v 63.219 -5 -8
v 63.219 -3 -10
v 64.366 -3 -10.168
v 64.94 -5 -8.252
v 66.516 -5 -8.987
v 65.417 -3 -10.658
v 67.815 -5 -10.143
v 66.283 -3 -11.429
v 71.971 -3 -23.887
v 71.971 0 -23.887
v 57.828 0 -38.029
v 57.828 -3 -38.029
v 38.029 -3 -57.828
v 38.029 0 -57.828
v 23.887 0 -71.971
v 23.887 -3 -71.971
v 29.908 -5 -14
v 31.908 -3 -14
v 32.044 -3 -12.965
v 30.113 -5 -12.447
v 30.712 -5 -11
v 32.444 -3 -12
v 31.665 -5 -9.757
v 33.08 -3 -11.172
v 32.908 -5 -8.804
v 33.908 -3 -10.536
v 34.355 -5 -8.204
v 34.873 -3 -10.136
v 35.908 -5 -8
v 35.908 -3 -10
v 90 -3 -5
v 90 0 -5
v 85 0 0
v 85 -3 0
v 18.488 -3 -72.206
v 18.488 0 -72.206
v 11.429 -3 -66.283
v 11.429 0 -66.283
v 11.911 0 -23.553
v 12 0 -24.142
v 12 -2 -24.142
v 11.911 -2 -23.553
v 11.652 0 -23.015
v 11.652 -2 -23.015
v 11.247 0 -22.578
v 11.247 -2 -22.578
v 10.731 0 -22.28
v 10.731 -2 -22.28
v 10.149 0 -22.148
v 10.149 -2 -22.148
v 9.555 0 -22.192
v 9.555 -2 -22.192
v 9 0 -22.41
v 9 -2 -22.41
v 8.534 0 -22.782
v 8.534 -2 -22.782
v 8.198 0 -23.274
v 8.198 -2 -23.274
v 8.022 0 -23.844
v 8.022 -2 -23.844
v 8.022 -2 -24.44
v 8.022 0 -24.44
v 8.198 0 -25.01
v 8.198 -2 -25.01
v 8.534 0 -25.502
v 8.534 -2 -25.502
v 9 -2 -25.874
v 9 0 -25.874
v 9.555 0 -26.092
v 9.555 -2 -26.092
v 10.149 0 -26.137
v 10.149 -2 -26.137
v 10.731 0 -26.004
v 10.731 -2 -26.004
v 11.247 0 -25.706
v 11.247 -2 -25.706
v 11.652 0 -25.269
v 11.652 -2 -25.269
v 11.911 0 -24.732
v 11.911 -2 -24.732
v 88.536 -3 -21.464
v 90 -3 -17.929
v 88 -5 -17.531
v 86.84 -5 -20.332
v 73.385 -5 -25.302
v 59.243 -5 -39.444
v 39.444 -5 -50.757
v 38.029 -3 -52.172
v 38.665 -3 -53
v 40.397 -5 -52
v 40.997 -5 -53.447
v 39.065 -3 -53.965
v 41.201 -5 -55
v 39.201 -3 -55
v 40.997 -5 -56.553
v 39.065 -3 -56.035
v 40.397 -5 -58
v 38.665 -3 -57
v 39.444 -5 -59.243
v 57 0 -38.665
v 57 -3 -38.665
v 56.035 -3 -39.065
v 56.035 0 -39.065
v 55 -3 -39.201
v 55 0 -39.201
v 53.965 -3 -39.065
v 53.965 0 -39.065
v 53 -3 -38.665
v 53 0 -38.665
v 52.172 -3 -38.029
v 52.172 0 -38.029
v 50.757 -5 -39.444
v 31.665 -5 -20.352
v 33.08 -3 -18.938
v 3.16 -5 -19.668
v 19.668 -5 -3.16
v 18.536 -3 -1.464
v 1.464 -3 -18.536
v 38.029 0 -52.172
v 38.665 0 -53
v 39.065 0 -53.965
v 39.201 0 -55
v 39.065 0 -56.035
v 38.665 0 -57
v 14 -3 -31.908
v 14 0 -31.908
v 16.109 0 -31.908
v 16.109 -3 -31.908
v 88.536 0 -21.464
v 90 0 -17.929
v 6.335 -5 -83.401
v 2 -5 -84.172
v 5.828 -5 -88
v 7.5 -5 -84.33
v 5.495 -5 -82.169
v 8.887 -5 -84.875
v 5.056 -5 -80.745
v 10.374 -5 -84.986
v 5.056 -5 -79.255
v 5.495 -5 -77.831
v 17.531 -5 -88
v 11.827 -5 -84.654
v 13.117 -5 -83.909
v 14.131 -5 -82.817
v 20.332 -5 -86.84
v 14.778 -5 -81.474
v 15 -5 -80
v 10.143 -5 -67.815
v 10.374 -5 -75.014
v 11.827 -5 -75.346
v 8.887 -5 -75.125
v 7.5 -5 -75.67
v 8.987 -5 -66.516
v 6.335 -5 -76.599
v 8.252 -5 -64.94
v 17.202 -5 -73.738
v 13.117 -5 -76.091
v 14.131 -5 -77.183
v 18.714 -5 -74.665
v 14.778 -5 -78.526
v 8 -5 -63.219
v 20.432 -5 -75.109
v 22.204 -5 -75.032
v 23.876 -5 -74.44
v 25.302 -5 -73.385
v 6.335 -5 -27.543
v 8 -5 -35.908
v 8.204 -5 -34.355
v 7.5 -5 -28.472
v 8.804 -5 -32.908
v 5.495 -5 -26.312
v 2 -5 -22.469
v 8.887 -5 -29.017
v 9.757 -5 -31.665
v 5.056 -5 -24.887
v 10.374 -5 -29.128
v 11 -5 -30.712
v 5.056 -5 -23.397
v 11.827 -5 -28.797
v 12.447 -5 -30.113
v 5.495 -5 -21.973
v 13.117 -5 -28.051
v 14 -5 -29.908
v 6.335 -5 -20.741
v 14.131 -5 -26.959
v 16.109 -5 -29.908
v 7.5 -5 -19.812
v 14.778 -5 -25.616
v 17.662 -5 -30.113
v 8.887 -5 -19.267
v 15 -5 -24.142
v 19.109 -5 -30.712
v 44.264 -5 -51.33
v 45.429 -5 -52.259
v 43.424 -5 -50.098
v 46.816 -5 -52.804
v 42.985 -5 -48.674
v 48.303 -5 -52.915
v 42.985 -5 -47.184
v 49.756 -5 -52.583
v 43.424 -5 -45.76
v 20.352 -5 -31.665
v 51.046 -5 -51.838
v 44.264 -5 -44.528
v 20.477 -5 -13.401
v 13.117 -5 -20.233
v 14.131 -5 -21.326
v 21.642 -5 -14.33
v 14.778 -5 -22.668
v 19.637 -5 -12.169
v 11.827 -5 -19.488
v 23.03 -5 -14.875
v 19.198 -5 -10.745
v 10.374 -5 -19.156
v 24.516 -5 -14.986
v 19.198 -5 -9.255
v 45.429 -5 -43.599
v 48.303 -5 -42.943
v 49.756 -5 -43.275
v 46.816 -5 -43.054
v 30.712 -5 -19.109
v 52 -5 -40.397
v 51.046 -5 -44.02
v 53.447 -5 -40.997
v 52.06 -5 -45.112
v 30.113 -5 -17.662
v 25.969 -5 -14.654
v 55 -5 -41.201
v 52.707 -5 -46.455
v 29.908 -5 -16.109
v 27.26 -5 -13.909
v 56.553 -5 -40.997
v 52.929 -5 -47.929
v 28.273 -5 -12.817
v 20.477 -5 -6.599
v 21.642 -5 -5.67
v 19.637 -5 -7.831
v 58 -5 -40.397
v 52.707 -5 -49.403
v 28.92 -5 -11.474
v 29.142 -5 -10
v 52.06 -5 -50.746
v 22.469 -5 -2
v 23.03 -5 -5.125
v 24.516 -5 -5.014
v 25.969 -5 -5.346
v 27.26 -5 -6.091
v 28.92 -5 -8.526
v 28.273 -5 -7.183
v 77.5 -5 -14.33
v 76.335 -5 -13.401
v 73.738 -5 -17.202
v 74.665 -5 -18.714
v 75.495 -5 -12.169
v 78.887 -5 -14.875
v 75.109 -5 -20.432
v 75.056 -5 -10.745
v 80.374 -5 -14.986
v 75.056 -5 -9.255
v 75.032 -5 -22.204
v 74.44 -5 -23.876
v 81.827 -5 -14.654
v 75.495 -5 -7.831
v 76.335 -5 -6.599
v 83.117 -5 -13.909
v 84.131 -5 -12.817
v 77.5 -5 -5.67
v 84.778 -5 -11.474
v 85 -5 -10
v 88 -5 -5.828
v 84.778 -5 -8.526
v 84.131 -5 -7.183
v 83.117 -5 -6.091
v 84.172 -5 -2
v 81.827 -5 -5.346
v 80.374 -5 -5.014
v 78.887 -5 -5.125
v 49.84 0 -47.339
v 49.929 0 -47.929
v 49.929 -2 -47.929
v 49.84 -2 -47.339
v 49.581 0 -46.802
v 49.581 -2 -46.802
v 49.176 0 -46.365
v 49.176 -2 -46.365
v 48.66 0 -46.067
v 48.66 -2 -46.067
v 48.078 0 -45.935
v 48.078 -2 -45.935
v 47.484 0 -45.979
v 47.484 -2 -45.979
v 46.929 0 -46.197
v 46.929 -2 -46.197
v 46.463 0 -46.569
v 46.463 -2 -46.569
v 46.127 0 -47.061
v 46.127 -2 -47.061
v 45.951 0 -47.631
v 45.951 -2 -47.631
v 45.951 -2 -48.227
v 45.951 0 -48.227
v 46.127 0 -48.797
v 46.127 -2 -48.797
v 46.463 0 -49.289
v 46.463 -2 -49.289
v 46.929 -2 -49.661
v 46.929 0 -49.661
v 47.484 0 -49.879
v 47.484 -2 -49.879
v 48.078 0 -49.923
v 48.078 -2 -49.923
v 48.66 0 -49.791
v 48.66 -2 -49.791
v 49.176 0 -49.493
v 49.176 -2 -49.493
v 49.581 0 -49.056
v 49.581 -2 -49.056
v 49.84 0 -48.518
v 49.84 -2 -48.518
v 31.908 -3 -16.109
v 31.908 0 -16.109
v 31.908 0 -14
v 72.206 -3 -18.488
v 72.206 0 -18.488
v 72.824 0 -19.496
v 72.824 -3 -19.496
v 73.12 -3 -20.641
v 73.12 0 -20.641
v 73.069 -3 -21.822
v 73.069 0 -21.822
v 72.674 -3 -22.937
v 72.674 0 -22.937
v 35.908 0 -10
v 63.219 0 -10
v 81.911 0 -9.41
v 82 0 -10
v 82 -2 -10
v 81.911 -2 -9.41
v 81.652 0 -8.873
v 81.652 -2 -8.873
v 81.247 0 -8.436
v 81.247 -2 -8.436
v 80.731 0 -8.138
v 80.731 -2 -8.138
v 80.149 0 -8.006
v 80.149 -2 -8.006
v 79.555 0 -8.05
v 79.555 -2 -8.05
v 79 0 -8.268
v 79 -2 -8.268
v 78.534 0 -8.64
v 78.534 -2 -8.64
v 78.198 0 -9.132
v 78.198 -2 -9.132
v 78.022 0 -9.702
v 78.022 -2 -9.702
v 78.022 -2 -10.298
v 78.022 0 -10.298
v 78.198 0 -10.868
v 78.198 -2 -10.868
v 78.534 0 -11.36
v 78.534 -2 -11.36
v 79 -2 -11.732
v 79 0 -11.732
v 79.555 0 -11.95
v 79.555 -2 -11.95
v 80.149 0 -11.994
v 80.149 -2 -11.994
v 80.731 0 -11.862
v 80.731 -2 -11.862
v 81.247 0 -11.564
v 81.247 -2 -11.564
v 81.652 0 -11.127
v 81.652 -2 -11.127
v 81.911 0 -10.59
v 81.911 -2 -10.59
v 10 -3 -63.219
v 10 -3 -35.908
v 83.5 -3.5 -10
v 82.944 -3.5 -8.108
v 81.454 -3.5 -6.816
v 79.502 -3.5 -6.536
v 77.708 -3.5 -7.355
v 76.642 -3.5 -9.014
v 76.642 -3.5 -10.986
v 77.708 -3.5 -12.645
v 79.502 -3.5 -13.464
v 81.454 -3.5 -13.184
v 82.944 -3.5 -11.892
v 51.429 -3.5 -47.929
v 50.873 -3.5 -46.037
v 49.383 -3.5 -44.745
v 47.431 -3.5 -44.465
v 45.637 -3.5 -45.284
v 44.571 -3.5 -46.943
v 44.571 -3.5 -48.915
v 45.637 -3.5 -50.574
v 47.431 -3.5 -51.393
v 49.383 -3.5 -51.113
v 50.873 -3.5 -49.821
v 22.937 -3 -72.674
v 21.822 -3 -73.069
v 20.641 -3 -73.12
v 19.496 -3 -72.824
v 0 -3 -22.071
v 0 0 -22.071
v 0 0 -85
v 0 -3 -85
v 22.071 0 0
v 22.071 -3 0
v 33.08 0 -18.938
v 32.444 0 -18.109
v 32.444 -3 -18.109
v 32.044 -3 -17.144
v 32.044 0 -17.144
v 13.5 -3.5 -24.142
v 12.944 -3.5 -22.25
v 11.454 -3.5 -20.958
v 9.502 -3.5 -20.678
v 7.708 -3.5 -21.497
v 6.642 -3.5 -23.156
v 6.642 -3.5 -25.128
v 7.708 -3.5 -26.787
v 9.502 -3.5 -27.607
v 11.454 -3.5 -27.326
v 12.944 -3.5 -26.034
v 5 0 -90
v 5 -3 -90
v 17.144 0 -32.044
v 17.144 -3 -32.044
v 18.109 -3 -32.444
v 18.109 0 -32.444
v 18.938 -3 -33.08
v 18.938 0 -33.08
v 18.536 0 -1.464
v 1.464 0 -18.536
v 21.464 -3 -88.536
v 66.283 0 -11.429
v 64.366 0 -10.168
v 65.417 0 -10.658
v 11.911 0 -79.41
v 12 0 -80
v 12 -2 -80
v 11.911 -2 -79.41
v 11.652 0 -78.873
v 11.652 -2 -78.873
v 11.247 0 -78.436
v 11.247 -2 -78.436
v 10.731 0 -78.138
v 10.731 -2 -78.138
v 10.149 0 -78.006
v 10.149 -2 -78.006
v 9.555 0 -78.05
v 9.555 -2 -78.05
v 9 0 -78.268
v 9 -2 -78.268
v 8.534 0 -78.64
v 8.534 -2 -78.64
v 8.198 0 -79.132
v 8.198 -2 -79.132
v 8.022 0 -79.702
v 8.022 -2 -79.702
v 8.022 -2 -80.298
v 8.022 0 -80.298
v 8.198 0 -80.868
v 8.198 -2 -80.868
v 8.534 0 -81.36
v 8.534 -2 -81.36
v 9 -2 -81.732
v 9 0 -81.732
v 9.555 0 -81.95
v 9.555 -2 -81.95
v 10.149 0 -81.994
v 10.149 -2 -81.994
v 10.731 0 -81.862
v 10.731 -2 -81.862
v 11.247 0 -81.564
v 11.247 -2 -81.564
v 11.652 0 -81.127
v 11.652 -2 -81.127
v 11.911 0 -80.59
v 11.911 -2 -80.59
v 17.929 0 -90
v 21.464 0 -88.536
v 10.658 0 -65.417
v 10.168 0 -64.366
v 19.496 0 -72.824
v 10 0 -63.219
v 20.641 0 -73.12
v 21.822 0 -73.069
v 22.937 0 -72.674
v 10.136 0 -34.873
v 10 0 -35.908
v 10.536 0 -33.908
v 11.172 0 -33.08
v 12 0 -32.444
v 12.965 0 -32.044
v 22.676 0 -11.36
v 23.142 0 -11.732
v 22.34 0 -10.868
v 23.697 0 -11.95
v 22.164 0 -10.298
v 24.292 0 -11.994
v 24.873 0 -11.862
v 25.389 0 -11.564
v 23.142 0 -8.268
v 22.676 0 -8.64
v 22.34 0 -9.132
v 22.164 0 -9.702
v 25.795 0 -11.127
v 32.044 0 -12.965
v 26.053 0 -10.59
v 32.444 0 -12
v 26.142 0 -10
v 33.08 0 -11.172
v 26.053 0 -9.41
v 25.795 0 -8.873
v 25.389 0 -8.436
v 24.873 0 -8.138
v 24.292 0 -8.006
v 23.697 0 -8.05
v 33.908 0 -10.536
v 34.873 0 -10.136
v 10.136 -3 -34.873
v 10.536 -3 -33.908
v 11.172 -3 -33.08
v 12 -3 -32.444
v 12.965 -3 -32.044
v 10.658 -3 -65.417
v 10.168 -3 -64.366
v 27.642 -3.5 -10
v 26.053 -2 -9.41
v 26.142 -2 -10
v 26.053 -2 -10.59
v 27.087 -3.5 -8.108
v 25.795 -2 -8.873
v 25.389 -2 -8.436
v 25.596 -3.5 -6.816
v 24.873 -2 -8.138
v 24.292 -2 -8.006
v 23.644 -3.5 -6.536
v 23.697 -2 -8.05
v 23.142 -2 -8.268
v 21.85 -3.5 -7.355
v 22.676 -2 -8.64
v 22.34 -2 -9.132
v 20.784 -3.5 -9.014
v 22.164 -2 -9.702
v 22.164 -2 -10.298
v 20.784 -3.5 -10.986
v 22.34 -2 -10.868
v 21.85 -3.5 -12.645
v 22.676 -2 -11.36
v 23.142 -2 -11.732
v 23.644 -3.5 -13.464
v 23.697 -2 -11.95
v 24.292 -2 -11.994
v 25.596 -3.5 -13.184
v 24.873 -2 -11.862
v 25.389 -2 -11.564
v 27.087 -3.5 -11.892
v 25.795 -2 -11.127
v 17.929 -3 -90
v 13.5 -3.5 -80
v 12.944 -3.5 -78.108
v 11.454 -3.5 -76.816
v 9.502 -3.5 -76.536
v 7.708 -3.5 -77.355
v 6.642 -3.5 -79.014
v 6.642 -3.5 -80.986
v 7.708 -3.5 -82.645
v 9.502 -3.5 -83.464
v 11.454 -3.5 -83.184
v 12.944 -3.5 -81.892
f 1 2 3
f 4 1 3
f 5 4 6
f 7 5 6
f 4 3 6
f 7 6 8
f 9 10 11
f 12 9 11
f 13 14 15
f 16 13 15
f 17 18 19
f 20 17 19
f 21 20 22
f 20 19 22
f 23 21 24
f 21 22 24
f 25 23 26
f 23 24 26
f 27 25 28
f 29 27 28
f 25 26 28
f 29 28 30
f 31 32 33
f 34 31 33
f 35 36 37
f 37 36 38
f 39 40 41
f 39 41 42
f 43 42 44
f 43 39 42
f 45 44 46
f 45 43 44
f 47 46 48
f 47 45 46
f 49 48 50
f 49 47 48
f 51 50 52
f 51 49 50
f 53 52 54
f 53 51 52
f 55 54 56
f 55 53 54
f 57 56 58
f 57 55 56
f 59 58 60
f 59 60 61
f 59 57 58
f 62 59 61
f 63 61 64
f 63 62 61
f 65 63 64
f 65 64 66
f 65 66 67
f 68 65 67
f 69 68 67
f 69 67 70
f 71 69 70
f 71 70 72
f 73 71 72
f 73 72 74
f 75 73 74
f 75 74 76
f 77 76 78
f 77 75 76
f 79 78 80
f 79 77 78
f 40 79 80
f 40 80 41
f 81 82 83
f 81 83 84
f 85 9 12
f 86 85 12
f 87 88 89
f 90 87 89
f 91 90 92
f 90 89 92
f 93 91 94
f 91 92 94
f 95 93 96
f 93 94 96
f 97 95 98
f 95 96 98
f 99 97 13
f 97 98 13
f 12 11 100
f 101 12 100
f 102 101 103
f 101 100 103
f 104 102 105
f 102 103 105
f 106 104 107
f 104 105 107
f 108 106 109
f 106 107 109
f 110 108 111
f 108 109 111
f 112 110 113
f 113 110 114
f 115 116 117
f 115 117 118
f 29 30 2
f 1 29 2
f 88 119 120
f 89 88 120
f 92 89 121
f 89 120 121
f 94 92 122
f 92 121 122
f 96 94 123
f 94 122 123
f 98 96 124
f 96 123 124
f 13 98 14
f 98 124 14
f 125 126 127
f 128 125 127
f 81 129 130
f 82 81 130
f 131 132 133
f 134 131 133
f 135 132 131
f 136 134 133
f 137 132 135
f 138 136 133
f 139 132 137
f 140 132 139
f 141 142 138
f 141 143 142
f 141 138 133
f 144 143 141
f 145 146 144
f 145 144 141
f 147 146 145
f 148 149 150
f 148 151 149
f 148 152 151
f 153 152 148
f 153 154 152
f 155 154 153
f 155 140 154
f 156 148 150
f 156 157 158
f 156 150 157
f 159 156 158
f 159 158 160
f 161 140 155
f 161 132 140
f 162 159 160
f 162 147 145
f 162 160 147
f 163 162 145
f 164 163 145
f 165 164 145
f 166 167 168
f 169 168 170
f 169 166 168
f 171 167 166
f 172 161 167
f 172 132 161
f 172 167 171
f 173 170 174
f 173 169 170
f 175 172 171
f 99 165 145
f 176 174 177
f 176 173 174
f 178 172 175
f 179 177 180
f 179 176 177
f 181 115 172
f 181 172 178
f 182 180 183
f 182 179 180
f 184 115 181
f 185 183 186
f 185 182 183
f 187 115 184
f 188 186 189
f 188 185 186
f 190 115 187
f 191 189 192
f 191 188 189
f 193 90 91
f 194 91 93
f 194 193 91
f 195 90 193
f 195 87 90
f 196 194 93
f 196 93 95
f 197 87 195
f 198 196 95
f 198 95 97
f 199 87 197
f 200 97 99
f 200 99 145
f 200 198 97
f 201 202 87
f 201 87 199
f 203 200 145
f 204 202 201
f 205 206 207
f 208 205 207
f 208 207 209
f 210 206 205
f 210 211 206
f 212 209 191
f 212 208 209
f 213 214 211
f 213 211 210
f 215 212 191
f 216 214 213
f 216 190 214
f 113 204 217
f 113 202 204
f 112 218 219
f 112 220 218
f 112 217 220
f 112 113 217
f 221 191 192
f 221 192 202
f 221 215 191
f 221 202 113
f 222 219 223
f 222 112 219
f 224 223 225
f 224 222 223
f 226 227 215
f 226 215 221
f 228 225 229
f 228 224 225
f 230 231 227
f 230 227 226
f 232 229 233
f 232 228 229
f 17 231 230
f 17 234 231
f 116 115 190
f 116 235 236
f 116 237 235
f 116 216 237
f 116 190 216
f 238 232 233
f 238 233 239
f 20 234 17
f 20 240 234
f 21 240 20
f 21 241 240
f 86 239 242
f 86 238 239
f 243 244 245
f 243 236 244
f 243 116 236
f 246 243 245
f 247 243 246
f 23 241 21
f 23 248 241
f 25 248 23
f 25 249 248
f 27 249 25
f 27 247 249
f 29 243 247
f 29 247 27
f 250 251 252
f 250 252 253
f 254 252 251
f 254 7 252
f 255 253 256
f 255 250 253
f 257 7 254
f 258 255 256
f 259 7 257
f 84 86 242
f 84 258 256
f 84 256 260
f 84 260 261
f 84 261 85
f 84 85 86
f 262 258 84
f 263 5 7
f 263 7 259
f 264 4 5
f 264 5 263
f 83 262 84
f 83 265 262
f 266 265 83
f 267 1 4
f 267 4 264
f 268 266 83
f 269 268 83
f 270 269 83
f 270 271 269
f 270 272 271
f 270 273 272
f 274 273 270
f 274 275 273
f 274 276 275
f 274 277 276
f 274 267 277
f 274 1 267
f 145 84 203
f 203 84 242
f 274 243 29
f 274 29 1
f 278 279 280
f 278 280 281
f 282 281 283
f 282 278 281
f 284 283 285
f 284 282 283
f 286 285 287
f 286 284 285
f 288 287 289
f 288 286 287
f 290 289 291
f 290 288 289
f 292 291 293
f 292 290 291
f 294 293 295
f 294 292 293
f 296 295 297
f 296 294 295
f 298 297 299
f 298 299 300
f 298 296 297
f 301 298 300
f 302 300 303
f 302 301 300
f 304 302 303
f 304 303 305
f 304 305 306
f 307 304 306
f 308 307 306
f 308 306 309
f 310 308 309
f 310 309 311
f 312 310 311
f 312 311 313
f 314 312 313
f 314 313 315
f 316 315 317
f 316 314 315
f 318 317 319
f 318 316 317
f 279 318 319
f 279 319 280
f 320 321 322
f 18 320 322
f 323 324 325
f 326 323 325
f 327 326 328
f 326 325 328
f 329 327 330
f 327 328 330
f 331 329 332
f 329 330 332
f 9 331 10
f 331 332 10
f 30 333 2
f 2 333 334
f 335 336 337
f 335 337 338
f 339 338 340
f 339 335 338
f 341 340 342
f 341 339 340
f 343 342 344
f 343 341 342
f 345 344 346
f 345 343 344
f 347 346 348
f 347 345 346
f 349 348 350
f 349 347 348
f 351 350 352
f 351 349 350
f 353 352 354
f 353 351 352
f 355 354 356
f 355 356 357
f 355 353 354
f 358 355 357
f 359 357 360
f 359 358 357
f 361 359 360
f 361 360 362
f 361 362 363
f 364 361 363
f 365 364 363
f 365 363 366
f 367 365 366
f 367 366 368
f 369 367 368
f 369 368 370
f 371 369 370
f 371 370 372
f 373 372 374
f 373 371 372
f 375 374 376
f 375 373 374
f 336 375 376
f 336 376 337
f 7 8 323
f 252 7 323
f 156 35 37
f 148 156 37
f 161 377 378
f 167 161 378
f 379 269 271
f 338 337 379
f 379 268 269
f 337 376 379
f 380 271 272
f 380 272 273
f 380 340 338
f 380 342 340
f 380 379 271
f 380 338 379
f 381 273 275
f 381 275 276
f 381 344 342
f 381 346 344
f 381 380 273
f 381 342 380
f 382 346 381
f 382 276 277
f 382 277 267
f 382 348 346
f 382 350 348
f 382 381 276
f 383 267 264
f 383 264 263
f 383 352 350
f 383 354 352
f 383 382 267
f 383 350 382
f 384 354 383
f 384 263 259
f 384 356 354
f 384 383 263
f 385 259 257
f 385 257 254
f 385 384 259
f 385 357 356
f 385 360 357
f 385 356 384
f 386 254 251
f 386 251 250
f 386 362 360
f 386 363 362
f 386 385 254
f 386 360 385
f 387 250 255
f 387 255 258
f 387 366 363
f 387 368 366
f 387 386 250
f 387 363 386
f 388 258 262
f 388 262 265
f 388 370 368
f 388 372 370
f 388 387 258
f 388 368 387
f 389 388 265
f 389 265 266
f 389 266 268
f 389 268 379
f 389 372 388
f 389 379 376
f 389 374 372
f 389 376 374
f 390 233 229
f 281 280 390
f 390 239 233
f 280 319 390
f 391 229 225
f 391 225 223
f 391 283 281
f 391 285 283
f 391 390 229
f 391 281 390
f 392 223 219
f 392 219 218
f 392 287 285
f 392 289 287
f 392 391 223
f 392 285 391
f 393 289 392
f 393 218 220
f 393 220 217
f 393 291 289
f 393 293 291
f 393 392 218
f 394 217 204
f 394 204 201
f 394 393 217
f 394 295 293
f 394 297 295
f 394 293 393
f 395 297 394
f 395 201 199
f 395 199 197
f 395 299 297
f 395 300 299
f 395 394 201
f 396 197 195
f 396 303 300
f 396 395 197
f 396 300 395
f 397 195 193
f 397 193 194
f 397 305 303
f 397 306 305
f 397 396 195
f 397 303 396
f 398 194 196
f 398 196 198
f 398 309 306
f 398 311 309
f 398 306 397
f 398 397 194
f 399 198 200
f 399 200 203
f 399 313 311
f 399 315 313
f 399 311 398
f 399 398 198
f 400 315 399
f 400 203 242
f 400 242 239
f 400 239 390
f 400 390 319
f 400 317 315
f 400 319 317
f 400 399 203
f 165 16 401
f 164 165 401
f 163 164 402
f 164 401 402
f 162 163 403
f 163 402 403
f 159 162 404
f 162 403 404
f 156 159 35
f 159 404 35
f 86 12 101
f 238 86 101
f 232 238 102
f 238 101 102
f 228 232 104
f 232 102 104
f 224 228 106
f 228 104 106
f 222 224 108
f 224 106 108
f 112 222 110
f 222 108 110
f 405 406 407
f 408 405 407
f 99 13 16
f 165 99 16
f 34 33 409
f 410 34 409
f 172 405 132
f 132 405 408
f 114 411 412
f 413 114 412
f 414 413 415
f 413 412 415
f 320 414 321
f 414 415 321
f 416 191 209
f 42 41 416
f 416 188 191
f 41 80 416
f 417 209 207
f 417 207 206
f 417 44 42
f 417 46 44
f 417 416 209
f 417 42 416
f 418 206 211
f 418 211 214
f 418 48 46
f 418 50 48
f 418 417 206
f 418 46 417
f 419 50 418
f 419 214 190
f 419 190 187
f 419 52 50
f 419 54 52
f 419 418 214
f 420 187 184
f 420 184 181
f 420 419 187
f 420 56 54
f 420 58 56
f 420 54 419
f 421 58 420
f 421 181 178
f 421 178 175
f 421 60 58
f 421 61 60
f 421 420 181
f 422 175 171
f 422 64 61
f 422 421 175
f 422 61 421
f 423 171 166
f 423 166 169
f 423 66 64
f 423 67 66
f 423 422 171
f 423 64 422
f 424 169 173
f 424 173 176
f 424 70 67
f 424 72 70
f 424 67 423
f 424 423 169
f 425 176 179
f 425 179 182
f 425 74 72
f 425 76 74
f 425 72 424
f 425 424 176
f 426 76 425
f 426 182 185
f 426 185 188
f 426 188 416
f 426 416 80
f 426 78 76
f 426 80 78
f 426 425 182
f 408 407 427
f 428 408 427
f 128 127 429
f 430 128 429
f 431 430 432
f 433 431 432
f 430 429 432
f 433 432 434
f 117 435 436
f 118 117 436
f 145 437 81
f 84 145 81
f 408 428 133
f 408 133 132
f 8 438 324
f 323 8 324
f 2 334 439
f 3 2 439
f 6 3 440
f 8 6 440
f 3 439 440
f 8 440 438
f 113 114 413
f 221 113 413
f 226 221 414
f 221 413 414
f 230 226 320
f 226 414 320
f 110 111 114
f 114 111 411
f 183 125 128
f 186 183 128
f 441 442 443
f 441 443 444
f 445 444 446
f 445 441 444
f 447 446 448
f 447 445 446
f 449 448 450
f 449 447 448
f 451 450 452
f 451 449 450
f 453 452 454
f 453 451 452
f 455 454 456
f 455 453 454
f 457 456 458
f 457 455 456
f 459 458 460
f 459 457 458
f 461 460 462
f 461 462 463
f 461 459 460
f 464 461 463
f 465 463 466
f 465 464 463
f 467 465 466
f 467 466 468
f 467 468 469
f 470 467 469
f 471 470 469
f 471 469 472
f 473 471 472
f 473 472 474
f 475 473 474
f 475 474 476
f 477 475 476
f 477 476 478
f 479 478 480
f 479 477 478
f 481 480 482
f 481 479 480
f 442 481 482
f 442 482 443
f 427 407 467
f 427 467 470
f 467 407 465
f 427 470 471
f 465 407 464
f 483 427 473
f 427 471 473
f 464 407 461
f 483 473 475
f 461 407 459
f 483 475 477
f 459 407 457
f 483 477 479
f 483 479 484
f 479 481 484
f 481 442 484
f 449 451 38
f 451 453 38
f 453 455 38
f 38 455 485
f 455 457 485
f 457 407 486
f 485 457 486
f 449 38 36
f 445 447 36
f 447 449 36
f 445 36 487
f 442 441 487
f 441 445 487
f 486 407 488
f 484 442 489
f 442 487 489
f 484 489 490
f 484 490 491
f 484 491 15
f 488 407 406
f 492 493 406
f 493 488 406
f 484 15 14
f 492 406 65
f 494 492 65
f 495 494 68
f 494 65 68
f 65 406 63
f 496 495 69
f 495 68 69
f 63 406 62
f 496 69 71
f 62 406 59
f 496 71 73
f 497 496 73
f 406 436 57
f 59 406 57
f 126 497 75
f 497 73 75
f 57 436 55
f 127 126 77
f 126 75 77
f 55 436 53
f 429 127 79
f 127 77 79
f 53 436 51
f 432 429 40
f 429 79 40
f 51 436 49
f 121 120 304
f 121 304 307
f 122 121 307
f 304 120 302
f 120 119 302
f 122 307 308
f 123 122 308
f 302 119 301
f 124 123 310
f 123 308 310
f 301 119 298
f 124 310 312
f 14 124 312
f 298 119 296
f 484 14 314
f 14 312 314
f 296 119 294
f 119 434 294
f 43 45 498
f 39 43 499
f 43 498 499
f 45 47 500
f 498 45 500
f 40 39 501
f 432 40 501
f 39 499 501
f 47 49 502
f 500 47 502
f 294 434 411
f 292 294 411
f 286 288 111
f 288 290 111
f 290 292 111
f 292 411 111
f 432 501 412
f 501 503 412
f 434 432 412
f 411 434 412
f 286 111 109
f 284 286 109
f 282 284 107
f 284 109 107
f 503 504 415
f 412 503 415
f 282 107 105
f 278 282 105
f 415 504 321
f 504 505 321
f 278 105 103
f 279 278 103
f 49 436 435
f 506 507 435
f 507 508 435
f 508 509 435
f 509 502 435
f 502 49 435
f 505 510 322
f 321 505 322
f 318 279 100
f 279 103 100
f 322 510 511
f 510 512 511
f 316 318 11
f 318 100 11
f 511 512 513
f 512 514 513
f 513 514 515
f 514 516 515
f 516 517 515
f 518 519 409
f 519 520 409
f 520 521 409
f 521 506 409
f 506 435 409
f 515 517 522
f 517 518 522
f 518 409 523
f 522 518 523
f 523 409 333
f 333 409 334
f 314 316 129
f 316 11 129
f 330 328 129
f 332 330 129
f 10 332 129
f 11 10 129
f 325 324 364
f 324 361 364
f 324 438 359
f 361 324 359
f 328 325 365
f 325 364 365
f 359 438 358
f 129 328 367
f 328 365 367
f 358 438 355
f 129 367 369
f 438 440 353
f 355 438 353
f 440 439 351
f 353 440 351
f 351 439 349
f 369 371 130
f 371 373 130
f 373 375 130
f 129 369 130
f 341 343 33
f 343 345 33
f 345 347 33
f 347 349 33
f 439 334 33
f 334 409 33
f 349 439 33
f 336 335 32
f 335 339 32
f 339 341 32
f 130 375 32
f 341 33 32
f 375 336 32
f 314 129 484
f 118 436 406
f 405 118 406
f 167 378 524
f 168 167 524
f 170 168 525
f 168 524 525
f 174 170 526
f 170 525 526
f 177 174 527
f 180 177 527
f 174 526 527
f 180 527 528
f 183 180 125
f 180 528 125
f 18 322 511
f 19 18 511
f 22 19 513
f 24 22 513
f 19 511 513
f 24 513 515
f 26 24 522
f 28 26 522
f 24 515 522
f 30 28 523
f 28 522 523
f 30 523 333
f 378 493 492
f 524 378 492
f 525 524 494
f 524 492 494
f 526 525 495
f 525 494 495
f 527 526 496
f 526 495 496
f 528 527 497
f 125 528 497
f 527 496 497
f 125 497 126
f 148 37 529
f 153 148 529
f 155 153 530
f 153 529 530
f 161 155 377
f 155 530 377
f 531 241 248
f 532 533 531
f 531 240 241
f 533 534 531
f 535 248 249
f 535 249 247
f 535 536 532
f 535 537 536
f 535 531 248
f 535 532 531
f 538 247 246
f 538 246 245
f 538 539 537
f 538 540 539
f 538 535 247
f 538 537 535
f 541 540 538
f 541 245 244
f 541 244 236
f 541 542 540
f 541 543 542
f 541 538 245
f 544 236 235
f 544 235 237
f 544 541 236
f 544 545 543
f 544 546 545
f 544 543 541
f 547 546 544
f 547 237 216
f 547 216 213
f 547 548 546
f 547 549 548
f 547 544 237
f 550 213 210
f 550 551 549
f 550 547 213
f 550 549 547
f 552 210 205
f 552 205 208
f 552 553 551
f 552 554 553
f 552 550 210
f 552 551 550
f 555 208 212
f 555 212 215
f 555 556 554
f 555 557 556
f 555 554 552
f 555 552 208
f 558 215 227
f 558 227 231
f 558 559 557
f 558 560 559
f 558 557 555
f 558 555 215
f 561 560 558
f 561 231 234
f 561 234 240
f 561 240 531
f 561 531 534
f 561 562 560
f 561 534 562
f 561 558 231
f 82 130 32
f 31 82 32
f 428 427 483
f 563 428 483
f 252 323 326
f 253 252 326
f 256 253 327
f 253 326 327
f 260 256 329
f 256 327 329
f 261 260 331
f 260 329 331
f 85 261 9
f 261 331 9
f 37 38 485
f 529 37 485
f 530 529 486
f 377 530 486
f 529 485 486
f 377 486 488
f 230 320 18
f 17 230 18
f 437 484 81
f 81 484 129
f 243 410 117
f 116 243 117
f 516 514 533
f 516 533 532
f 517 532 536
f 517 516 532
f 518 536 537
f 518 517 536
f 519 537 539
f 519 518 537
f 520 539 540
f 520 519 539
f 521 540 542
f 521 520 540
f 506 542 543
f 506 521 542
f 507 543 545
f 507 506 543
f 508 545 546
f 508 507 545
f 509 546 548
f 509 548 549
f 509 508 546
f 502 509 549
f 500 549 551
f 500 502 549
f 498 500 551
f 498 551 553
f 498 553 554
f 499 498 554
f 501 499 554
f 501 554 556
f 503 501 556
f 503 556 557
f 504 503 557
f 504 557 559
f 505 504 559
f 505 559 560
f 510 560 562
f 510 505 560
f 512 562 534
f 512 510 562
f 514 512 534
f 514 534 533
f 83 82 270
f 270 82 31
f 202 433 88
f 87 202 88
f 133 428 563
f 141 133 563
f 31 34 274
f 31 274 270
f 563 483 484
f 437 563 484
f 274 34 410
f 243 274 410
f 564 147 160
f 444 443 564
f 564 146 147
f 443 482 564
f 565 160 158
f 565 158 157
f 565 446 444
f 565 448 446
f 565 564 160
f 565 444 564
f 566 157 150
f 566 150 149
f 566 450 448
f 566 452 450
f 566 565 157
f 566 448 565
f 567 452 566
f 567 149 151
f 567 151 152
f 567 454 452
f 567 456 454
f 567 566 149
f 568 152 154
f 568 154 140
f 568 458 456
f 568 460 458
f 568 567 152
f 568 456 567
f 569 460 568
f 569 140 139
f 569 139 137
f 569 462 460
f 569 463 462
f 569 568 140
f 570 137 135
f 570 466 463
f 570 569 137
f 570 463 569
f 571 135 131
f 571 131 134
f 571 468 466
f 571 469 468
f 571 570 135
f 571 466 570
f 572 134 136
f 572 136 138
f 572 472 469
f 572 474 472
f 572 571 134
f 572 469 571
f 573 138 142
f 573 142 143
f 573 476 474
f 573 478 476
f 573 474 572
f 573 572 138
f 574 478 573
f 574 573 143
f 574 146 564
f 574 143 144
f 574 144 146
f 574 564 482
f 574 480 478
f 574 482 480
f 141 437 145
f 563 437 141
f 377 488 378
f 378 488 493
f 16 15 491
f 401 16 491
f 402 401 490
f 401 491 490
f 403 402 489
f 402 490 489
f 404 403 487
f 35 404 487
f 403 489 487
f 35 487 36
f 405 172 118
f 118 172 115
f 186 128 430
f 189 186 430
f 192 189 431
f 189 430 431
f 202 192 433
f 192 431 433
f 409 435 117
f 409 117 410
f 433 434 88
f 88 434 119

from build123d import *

# Parameters (mm, degrees)
F0_R        = 2
F1_DEPTH    = 5
F2_T1_DEPTH = 30.7168298797
F2_T3_DEPTH = 16.2857086021
F3_SIZE     = 2
F4_SIZE     = 3
F5_SIZE     = 2


# Not quite as in the source:
# - a fillet or chamfer that OpenCascade refuses, or shapes differently, is made with other operations: its cross-section is extruded or revolved along the edge and cut away or added


with BuildPart() as f1:
    # F0 (on Front) → F1 (new body)
    with BuildSketch(Plane.XZ):
        Polygon((20, 0), (0, -20), (0, -90), (20, -90), (90, -20), (90, 0), align=None)
        with Locations((10, -80)):
            Circle(F0_R, mode=Mode.SUBTRACT)
        with BuildLine():
            Line((14, -31.908116908), (16.1091270347, -31.908116908))
            ThreePointArc((16.1091270347, -31.908116908), (17.6398607642, -32.2125987779), (18.9375541595, -33.0796897832))
            Line((18.9375541595, -33.0796897832), (38.0294372515, -52.1715728753))
            ThreePointArc((38.0294372515, -52.1715728753), (39.2010101268, -55), (38.0294372515, -57.8284271247))
            Line((38.0294372515, -57.8284271247), (23.8873016278, -71.9705627485))
            ThreePointArc((23.8873016278, -71.9705627485), (21.2333520525, -73.1383285101), (18.4877240643, -72.2063133962))
            Line((18.4877240643, -72.2063133962), (11.4288495613, -66.2832144042))
            ThreePointArc((11.4288495613, -66.2832144042), (10.3747688519, -64.9095096787), (10, -63.2190366317))
            Line((10, -63.2190366317), (10, -35.908116908))
            ThreePointArc((10, -35.908116908), (11.1715728753, -33.0796897832), (14, -31.908116908))
        make_face(mode=Mode.SUBTRACT)
        with Locations((47.9289321881, -47.9289321881)):
            Circle(F0_R, mode=Mode.SUBTRACT)
        with Locations((10, -24.1421356237)):
            Circle(F0_R, mode=Mode.SUBTRACT)
        with Locations((24.1421356237, -10)):
            Circle(F0_R, mode=Mode.SUBTRACT)
        with BuildLine():
            ThreePointArc((63.2190366317, -10), (64.9095096787, -10.3747688519), (66.2832144042, -11.4288495613))
            Line((66.2832144042, -11.4288495613), (72.2063133962, -18.4877240643))
            ThreePointArc((72.2063133962, -18.4877240643), (73.1383285101, -21.2333520525), (71.9705627485, -23.8873016278))
            Line((71.9705627485, -23.8873016278), (57.8284271247, -38.0294372515))
            ThreePointArc((57.8284271247, -38.0294372515), (55, -39.2010101268), (52.1715728753, -38.0294372515))
            Line((52.1715728753, -38.0294372515), (33.0796897832, -18.9375541595))
            ThreePointArc((33.0796897832, -18.9375541595), (32.2125987779, -17.6398607642), (31.908116908, -16.1091270347))
            Line((31.908116908, -16.1091270347), (31.908116908, -14))
            ThreePointArc((31.908116908, -14), (33.0796897832, -11.1715728753), (35.908116908, -10))
            Line((35.908116908, -10), (63.2190366317, -10))
        make_face(mode=Mode.SUBTRACT)
        with Locations((80, -10)):
            Circle(F0_R, mode=Mode.SUBTRACT)
    extrude(amount=F1_DEPTH)

    # F2: chamfer of 5 on 6 edges, made by hand

    # F2_s2 → F2_t1 (cut)
    with BuildSketch(Plane.XZ.offset(-12.8584149398)):
        Polygon((90, -5), (85, 0), (90, 0), align=None)
        Polygon((0, -85), (5, -90), (0, -90), align=None)
    extrude(amount=F2_T1_DEPTH, mode=Mode.SUBTRACT)

    # F2_s4 → F2_t3 (cut)
    with BuildSketch(Plane.XZ.offset(-5.6428543011)):
        Polygon((1.4644660941, -18.5355339059), (0, -22.0710678119), (0, -20), align=None)
        Polygon((18.5355339059, -1.4644660941), (22.0710678119, 0), (20, 0), align=None)
        Polygon((88.5355339059, -21.4644660941), (90, -17.9289321881), (90, -20), align=None)
        Polygon((17.9289321881, -90), (21.4644660941, -88.5355339059), (20, -90), align=None)
    extrude(amount=F2_T3_DEPTH, mode=Mode.SUBTRACT)

    # F3
    f3_edges = [f1.edges().sort_by_distance(p)[0] for p in [
        (0.732233, -5, -20.303301),
        (20.303301, -5, -0.732233),
        (10, -5, -10),
        (87.5, -5, -2.5),
        (89.267767, -5, -19.696699),
        (90, -5, -11.464466),
        (53.535534, -5, 0),
        (19.696699, -5, -89.267767),
        (2.5, -5, -87.5),
        (11.464466, -5, -90),
        (0, -5, -53.535534),
        (55, -5, -55),
    ]]
    chamfer(f3_edges, length=F3_SIZE)

    # F4
    f4_edges = [f1.edges().sort_by_distance(p)[0] for p in [
        (8, -5, -24.142136),
        (22.142136, -5, -10),
        (78, -5, -10),
        (45.928932, -5, -47.928932),
        (8, -5, -80),
    ]]
    chamfer(f4_edges, length=F4_SIZE)

    # F5
    f5_edges = [f1.edges().sort_by_distance(p)[0] for p in [
        (30.958369, -5, -64.899495),
        (21.233352, -5, -73.138329),
        (14.958287, -5, -69.244764),
        (10.374769, -5, -64.90951),
        (10, -5, -49.563577),
        (11.171573, -5, -33.07969),
        (17.639861, -5, -32.212599),
        (14, -2.5, -31.908117),
        (15.054564, -5, -31.908117),
        (28.483496, -5, -42.625631),
        (39.20101, -5, -55),
        (42.625631, -5, -28.483496),
        (33.07969, -5, -11.171573),
        (31.908117, -5, -15.054564),
        (49.563577, -5, -10),
        (32.212599, -5, -17.639861),
        (64.90951, -5, -10.374769),
        (69.244764, -5, -14.958287),
        (55, -5, -39.20101),
        (73.138329, -5, -21.233352),
        (64.899495, -5, -30.958369),
    ]]
    chamfer(f5_edges, length=F5_SIZE)


solid = f1.part
